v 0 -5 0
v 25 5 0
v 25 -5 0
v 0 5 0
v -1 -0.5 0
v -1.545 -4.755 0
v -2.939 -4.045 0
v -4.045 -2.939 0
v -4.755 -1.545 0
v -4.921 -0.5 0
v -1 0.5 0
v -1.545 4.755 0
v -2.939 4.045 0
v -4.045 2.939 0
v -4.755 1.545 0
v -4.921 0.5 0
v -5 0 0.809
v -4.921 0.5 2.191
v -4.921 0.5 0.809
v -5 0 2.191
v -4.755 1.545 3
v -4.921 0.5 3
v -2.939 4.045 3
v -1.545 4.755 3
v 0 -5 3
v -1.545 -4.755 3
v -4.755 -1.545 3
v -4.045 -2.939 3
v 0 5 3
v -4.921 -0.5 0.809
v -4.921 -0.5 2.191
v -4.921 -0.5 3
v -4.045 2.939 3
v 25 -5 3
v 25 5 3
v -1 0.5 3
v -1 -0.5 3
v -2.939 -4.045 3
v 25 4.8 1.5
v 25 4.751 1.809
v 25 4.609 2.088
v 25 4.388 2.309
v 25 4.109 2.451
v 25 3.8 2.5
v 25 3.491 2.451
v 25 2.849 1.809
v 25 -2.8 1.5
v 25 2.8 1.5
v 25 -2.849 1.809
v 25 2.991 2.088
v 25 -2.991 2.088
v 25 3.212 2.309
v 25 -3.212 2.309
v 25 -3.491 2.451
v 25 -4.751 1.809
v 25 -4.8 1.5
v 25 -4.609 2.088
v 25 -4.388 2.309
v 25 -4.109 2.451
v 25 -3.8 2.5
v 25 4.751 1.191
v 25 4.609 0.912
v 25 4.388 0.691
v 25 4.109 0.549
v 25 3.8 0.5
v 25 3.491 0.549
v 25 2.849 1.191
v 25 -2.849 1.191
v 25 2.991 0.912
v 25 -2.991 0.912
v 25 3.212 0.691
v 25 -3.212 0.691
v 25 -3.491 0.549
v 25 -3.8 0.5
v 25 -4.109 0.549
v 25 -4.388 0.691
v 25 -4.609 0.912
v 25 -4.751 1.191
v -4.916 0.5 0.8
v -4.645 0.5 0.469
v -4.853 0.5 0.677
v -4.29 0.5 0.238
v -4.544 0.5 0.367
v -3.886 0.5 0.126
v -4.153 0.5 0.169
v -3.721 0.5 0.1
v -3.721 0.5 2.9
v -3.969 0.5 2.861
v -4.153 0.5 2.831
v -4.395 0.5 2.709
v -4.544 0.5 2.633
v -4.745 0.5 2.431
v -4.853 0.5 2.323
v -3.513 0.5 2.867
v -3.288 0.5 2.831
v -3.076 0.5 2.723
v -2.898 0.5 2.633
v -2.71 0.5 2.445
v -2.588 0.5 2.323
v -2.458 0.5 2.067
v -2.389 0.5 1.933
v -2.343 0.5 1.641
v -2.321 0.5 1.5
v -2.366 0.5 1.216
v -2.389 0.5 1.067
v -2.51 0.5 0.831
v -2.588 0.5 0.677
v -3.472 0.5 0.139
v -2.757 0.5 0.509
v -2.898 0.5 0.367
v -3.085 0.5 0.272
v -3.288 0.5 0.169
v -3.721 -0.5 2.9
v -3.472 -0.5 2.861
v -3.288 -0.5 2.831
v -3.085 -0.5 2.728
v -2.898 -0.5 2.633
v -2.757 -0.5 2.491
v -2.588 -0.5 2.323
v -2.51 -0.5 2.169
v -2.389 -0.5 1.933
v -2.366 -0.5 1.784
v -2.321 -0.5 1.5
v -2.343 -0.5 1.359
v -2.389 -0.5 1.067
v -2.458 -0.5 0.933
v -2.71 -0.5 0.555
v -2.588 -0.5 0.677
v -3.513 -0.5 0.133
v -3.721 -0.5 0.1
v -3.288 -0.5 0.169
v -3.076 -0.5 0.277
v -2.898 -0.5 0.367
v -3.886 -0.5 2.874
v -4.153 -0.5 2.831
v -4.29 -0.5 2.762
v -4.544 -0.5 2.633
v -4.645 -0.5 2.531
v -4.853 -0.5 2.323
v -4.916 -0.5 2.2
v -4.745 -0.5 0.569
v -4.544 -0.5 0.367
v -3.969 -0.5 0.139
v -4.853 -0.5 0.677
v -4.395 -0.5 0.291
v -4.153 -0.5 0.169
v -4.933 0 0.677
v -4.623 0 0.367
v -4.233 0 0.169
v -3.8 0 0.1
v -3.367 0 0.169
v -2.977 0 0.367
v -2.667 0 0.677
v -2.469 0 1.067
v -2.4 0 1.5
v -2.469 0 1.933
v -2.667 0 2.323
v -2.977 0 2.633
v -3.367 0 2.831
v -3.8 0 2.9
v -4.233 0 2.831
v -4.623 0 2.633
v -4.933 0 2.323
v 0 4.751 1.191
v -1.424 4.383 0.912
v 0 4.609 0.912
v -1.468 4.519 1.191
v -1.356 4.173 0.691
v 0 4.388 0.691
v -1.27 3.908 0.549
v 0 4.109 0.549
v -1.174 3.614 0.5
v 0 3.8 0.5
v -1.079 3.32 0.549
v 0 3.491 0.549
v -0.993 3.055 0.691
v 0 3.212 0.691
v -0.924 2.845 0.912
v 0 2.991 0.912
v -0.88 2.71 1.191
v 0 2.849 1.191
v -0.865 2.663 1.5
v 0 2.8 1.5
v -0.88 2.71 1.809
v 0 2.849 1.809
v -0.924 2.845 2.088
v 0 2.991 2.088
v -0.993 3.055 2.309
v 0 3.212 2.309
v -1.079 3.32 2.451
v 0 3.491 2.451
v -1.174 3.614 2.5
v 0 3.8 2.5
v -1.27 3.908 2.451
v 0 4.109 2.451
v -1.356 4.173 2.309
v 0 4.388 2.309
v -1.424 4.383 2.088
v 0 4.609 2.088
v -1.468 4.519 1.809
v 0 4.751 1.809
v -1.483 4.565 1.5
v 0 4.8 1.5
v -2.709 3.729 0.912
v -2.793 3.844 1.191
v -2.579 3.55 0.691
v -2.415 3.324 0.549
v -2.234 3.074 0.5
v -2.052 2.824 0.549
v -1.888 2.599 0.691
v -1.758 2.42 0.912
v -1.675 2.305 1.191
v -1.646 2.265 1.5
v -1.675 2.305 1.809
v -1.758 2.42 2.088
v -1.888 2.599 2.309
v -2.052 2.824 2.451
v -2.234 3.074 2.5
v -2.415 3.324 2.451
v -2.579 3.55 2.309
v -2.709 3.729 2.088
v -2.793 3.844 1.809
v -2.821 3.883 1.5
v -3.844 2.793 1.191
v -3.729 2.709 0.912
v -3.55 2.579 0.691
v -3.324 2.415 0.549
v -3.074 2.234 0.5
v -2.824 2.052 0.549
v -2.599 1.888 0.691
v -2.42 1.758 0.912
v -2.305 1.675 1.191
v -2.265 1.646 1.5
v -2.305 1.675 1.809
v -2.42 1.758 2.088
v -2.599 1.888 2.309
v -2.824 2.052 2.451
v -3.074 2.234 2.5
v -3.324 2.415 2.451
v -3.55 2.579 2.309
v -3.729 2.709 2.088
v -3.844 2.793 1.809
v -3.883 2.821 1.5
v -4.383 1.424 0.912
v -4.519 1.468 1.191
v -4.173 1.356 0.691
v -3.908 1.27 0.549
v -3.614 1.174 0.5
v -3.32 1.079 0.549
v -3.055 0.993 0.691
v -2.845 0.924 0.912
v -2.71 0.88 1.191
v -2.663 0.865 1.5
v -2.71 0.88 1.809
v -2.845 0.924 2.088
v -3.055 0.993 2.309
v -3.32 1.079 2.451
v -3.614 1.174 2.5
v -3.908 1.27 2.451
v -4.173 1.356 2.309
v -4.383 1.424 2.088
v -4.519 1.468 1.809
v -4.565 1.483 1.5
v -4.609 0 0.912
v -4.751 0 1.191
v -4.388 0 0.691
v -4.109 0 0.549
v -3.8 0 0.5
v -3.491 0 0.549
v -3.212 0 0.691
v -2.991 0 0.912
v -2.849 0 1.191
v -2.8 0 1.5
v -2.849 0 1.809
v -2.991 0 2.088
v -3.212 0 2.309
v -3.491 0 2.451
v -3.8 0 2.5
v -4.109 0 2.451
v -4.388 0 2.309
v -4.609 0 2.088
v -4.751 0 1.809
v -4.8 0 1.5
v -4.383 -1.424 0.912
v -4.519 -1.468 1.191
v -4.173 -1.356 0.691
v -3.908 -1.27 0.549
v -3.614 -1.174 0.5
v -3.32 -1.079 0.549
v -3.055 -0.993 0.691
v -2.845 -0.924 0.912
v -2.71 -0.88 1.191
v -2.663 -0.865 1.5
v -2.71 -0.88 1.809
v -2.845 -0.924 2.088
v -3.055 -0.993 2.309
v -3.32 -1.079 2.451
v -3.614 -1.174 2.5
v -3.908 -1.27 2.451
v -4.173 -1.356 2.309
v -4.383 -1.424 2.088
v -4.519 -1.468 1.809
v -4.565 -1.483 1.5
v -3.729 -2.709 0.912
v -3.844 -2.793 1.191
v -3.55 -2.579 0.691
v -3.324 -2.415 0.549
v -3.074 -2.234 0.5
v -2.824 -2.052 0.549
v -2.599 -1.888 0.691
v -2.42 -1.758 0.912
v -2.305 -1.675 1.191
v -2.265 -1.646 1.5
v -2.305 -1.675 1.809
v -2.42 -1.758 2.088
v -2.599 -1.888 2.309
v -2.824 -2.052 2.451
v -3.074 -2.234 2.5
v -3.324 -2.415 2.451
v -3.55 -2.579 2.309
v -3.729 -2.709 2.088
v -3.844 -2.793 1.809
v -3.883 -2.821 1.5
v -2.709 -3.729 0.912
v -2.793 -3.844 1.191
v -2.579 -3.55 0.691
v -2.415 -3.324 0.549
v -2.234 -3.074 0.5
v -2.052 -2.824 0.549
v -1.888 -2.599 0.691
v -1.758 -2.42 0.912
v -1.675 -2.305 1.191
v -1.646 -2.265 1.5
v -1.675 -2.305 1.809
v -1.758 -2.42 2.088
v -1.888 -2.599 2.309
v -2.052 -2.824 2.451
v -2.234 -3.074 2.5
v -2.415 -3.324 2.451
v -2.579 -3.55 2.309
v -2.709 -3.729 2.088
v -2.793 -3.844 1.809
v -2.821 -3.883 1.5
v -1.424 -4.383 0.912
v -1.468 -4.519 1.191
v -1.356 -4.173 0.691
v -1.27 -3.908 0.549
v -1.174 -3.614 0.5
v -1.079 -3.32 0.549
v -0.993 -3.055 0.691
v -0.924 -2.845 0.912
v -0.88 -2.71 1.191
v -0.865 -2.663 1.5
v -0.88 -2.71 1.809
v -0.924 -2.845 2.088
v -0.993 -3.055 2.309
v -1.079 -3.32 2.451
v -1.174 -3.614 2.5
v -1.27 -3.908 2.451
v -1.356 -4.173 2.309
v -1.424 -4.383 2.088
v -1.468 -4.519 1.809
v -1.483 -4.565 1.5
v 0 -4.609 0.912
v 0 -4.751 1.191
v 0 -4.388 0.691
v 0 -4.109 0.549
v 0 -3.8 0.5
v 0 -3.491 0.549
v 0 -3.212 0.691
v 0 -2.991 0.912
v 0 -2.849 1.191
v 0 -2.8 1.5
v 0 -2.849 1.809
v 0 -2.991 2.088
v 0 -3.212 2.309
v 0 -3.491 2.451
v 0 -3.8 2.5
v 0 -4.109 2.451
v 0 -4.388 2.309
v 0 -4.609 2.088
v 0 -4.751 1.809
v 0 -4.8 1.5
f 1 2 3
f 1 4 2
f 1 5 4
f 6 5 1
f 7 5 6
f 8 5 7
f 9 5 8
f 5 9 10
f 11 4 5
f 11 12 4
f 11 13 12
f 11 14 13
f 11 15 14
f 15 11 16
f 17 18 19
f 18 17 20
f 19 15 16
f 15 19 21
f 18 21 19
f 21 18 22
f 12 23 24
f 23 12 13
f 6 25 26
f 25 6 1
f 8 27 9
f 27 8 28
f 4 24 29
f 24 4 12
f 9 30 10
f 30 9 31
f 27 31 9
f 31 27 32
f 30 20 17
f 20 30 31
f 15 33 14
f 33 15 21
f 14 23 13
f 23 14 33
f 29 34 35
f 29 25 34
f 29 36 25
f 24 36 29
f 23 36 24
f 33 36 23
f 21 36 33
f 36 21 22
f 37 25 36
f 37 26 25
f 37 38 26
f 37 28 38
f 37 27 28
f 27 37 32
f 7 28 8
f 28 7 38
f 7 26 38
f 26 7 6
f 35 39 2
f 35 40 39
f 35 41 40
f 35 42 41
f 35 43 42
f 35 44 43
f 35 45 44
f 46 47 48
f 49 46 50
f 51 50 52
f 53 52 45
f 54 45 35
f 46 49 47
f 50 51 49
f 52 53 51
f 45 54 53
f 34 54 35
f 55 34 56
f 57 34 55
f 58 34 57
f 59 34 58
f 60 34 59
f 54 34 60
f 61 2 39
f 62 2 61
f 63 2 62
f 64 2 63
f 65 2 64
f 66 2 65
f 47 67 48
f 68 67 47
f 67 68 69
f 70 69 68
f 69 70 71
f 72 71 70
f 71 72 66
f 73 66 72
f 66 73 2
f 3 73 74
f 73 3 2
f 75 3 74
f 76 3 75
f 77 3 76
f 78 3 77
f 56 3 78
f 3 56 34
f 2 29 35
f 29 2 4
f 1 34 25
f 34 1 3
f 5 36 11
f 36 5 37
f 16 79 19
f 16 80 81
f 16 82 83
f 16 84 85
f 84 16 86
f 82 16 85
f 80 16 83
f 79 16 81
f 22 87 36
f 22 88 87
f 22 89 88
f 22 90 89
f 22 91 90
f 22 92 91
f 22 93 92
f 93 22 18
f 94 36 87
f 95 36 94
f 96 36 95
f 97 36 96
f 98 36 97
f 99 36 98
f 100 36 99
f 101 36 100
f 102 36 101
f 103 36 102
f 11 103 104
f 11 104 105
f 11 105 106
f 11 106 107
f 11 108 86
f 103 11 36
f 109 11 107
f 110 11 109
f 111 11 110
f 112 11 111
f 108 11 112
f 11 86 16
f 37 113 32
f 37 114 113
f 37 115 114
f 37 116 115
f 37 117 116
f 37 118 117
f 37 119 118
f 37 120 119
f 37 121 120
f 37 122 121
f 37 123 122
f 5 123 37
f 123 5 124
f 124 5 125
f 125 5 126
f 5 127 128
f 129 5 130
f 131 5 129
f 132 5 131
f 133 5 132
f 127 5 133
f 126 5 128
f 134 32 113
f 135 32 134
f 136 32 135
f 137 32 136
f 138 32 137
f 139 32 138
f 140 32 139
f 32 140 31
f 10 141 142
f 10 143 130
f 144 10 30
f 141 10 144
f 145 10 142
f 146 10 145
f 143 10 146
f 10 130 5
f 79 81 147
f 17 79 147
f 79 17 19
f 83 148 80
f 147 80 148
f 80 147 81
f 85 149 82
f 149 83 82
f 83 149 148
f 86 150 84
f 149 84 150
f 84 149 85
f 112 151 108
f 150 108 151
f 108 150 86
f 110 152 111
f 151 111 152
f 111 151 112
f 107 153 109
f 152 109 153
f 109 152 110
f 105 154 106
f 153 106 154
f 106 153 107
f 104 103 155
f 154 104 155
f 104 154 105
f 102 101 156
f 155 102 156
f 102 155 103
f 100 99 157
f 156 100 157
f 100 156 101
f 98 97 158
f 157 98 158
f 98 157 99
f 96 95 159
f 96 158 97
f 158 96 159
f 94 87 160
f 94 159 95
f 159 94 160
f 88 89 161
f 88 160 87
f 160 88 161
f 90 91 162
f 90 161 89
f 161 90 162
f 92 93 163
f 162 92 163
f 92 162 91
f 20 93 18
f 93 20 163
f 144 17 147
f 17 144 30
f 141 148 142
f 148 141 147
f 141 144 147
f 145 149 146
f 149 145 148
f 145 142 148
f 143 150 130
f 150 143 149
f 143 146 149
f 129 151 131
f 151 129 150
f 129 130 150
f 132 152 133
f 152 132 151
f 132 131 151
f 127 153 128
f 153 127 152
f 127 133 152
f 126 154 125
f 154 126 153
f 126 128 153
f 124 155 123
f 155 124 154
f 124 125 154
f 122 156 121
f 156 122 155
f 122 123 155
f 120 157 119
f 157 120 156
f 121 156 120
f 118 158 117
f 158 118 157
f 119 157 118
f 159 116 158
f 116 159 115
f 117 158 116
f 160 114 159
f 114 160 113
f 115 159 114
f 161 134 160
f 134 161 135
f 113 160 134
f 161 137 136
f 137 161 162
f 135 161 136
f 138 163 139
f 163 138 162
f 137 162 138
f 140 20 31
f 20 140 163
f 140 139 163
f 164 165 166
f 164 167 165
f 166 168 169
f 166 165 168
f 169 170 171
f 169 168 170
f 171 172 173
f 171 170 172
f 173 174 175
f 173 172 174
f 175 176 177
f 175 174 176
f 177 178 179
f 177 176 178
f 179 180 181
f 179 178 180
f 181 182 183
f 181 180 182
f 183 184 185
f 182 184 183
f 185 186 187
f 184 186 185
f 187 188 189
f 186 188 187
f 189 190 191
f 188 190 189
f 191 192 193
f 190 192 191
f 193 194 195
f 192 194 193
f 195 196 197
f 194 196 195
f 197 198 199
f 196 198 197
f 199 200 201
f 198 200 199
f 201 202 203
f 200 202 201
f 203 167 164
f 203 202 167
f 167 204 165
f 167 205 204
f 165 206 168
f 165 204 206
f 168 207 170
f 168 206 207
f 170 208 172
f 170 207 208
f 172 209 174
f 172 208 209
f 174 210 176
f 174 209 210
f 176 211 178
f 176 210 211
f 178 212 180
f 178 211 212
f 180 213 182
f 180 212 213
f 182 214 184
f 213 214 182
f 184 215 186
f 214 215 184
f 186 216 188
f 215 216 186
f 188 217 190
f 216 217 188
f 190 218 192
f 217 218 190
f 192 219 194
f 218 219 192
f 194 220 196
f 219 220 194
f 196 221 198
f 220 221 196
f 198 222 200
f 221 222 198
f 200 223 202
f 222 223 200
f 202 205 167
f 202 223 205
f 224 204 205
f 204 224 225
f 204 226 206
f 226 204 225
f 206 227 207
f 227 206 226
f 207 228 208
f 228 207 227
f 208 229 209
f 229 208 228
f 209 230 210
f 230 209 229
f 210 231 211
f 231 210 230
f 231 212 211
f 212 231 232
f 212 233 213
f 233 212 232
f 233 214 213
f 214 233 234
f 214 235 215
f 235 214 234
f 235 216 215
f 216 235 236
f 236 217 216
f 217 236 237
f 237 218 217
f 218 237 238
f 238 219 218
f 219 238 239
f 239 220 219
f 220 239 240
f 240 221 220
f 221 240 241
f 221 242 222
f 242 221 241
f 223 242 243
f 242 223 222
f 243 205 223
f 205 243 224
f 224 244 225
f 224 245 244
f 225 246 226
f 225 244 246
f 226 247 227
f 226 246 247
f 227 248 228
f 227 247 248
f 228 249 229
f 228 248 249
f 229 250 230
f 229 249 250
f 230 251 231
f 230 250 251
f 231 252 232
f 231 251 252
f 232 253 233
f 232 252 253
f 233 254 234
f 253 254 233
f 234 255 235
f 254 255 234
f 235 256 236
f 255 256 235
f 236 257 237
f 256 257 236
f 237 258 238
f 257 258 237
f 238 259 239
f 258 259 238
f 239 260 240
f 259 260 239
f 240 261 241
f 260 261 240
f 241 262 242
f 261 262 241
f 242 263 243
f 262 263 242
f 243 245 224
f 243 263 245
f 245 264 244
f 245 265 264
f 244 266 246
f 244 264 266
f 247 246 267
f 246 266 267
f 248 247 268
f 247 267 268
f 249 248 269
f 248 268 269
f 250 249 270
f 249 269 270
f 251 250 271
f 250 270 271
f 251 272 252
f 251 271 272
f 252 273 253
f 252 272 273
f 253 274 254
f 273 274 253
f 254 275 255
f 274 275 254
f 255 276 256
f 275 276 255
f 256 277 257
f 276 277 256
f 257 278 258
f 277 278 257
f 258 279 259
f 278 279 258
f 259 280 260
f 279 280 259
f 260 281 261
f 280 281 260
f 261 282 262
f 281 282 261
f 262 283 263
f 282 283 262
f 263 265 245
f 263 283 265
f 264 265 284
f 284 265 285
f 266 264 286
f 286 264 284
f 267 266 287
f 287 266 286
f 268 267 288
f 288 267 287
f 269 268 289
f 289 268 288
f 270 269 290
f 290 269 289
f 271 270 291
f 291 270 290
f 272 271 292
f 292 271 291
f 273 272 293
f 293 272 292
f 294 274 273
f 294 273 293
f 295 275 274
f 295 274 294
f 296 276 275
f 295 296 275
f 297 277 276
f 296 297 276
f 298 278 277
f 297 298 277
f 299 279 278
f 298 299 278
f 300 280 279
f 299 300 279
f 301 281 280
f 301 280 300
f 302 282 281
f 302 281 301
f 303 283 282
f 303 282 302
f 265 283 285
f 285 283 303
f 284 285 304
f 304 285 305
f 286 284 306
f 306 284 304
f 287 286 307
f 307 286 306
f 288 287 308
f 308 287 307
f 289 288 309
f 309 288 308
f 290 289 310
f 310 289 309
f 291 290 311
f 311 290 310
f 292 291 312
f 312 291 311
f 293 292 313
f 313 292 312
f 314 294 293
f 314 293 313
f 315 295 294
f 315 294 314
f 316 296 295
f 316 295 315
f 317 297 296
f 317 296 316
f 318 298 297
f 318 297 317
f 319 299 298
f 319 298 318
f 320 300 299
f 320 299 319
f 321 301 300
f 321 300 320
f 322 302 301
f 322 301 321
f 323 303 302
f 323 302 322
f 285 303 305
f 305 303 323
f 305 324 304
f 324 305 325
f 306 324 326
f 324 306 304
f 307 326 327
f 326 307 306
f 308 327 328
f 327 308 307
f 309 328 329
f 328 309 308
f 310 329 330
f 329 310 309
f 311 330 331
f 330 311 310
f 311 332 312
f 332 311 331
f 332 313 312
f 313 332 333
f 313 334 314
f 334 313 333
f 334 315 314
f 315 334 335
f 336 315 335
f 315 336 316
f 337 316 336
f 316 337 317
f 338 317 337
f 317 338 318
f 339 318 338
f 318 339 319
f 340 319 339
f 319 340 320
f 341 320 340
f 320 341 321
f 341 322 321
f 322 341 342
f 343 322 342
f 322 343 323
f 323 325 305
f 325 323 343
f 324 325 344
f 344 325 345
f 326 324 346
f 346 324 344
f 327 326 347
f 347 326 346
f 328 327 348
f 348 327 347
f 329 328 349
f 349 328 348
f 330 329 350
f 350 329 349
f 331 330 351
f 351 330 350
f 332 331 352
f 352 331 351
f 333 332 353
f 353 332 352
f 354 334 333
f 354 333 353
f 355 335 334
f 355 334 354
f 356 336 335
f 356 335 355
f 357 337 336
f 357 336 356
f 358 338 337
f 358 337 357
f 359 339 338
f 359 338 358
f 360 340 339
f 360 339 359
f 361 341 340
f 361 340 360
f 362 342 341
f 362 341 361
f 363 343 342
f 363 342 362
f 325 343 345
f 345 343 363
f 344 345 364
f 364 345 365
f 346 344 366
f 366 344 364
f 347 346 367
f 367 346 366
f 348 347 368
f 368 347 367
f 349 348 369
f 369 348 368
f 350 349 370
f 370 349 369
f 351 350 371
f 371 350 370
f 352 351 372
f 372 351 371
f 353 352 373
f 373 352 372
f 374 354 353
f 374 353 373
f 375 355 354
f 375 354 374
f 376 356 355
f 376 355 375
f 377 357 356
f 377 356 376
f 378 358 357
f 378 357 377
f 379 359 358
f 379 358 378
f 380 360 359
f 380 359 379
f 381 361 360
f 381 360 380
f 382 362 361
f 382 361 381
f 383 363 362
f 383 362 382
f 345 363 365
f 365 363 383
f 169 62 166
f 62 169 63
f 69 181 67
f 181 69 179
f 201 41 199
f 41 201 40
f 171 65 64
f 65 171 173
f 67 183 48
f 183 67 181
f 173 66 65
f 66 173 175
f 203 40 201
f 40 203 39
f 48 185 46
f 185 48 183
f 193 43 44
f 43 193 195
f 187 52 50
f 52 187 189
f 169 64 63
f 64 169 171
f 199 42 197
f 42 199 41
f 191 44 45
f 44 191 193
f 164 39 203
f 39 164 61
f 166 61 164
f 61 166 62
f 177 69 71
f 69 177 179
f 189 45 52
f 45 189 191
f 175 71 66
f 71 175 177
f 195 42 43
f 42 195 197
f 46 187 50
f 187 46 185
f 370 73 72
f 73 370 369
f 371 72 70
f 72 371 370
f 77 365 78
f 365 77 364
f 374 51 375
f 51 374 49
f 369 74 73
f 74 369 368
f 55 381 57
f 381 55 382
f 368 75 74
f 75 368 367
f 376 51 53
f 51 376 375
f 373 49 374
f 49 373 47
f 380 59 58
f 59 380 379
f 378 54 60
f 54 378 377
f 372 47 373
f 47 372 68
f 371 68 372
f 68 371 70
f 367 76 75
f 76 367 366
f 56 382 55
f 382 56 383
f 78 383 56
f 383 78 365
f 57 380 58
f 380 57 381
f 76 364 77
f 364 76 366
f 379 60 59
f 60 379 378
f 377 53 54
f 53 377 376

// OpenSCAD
$fn=20;
epaisseur=3;
largeur = 10;
longueur = 30;

difference(){
    union(){
        cylinder(h=epaisseur,r=largeur/2);
        translate([0,-largeur/2,0]) cube([longueur-largeur/2,largeur,epaisseur]);
    }

    union(){
        translate([0,0,epaisseur/2]) rotate([0,0,90])
            rotate_extrude(angle = 180, convexity = 10) {
                translate([largeur/2-1.2,0,0]) circle(r=1);
            }
        translate([0,largeur/2-1.2,epaisseur/2]) rotate([0,90,0]) cylinder(longueur,r=1);
        translate([0,-largeur/2+1.2,epaisseur/2]) rotate([0,90,0]) cylinder(longueur,r=1);
        
        difference(){    
            translate([-6,0,0]) cube([10,1,10],center=true);
            translate([0,0,epaisseur/2]) rotate([0,0,90])
                rotate_extrude(angle = 180, convexity = 10) {
                    translate([largeur/2-1.2,0,0]) circle(r=1.4);
                }
            }
     }
 }
